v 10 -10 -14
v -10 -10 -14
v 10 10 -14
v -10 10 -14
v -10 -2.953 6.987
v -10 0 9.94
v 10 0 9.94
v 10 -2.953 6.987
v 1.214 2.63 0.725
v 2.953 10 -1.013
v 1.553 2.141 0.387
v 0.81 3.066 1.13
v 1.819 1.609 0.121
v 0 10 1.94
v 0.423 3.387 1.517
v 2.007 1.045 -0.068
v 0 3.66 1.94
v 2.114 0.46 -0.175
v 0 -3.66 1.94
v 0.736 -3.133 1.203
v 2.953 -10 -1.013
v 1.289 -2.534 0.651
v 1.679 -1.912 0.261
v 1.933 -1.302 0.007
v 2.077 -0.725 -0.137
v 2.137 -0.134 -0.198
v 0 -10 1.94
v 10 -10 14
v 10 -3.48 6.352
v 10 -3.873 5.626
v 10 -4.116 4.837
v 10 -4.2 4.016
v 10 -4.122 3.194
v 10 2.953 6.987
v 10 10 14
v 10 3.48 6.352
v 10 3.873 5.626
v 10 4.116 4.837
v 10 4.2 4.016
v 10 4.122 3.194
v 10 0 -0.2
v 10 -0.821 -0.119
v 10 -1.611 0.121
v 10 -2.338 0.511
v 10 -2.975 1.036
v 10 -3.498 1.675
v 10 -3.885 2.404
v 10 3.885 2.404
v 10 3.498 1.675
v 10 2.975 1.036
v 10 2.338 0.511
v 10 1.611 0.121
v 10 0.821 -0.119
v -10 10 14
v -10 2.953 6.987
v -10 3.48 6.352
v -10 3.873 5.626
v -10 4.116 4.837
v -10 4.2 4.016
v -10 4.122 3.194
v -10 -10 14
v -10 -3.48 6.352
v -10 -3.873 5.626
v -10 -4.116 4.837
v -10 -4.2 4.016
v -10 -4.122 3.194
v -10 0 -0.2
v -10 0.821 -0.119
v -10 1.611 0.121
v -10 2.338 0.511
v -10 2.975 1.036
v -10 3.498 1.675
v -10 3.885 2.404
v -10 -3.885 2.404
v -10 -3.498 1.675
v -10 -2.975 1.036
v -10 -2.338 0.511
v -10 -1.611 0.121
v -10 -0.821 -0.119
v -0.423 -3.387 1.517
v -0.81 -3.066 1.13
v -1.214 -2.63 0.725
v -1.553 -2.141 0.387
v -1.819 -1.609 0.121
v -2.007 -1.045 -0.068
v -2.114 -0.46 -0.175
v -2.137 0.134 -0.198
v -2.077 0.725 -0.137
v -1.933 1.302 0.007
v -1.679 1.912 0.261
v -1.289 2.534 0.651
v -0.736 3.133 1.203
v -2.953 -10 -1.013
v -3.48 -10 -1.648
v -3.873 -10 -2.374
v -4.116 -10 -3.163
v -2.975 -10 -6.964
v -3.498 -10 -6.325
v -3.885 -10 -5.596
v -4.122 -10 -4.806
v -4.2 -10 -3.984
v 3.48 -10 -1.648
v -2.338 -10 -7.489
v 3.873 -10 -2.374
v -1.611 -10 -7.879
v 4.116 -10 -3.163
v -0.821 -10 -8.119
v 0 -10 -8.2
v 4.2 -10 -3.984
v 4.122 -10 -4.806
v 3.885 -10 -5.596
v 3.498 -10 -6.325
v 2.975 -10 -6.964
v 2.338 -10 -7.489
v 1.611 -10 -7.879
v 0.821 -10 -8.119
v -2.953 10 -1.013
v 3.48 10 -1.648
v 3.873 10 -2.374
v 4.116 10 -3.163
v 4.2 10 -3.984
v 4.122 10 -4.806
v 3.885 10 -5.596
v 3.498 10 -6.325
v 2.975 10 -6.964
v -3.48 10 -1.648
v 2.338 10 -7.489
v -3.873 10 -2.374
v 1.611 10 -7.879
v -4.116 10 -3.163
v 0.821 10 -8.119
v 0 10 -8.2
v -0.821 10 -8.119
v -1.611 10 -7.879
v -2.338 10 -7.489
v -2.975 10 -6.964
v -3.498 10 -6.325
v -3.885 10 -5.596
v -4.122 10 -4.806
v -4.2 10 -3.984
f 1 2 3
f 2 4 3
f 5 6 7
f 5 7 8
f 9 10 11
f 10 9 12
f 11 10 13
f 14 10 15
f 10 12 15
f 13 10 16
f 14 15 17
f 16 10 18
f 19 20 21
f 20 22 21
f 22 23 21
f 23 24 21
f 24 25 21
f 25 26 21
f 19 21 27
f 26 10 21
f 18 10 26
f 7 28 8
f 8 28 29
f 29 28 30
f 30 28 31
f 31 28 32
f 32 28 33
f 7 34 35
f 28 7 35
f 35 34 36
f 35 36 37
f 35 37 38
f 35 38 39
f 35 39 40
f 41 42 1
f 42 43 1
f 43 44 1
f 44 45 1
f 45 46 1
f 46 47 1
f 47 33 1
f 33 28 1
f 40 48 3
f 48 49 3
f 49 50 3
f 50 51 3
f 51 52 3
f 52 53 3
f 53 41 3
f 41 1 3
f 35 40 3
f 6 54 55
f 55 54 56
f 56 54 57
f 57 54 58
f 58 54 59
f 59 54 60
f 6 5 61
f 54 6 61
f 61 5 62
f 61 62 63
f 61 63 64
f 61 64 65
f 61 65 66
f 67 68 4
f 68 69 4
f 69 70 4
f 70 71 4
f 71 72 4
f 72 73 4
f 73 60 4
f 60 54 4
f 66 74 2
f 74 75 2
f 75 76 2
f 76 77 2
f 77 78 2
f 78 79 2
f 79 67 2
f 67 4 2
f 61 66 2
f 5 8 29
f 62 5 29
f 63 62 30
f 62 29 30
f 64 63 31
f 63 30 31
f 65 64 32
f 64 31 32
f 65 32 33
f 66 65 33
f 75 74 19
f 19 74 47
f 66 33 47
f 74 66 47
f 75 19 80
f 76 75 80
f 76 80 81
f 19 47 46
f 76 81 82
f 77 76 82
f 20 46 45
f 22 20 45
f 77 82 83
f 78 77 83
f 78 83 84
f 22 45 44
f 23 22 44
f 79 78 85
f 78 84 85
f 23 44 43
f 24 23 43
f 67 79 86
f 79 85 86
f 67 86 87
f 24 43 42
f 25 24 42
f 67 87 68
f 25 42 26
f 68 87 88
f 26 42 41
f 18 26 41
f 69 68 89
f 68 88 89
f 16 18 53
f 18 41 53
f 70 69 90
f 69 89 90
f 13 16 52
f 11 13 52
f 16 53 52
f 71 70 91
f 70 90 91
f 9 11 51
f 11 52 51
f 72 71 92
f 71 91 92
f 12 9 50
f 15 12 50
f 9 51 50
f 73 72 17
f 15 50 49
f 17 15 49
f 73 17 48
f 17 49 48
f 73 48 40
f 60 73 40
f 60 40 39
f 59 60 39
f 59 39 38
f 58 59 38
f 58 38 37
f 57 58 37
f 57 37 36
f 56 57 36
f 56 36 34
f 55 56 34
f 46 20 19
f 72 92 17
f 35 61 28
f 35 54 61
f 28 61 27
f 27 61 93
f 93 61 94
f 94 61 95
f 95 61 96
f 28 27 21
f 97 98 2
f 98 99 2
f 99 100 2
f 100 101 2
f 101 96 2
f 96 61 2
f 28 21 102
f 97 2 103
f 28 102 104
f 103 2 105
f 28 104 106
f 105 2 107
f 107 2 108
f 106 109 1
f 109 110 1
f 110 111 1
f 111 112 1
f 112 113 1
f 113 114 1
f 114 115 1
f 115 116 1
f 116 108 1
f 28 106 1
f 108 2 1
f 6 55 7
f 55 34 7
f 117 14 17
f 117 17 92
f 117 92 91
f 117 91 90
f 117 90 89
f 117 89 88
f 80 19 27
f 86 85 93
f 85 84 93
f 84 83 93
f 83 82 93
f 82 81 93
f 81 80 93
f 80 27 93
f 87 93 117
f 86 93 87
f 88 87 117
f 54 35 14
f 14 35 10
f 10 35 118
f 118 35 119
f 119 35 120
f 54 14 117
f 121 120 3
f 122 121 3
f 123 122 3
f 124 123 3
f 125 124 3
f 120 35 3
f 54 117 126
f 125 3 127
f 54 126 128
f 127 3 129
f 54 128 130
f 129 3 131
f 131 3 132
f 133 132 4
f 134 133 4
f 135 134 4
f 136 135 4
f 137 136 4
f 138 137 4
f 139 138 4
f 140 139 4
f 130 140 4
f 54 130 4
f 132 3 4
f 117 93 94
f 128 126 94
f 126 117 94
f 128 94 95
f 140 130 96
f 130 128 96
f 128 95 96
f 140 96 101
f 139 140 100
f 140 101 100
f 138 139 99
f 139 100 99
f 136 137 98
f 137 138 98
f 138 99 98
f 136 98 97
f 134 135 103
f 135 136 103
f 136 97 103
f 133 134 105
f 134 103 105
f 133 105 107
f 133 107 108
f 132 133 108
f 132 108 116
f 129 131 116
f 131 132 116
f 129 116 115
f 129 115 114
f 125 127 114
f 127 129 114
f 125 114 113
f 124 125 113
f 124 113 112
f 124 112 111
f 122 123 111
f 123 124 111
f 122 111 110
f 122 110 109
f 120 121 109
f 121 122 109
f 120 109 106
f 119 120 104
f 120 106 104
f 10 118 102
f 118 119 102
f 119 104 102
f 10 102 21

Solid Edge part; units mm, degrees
sketch "Sketch1" plane through (0, 0, 0) normal (0, 0, 1) x (1, 0, 0)
  line L0 (-10, -10) -> (10, -10)
  line L1 (10, -10) -> (10, 10)
  line L2 (10, 10) -> (-10, 10)
  line L3 (-10, 10) -> (-10, -10)
  dimension "D1" = 20
  dimension "D2" = 20
extrude "Protrusion1" add sketch "Sketch1" along normal mid plane 28
sketch "Sketch2" plane through (0, -10, 12) normal (0, -1, 0) x (1, 0, 0)
  circle A0 centre (0, -16) radius 4.2
  dimension "D1" = 10
extrude "Cutout1" cut sketch "Sketch2" against normal through all
sketch "Sketch3" plane through (10, 0, 0) normal (1, 0, 0) x (0, 1, 0)
  circle A0 centre (0, 4) radius 4.2
  dimension "D1" = 10
  dimension "D2" = 8.4
extrude "Cutout2" cut sketch "Sketch3" against normal through all
sketch "Sketch4" plane through (0, -10, 0) normal (0, -1, 0) x (1, 0, 0)
  line L0 (0, -4) -> (2.9698, -1.0302)
  line L1 (2.9698, -1.0302) -> (0, 1.9397)
  line L2 (0, 1.9397) -> (-2.9698, -1.0302)
  line L3 (-2.9698, -1.0302) -> (0, -4)
extrude "Cutout3" cut sketch "Sketch4" against normal through all
sketch "Sketch5" plane through (10, 0, 0) normal (1, 0, 0) x (0, 1, 0)
  line L0 (0, 4) -> (2.9698, 6.9698)
  line L1 (2.9698, 6.9698) -> (0, 9.9397)
  line L2 (0, 9.9397) -> (-2.9698, 6.9698)
  line L3 (-2.9698, 6.9698) -> (0, 4)
extrude "Cutout4" cut sketch "Sketch5" against normal through all
extrude "Cutout5" [suppressed]
extrude "Cutout6" [suppressed]
